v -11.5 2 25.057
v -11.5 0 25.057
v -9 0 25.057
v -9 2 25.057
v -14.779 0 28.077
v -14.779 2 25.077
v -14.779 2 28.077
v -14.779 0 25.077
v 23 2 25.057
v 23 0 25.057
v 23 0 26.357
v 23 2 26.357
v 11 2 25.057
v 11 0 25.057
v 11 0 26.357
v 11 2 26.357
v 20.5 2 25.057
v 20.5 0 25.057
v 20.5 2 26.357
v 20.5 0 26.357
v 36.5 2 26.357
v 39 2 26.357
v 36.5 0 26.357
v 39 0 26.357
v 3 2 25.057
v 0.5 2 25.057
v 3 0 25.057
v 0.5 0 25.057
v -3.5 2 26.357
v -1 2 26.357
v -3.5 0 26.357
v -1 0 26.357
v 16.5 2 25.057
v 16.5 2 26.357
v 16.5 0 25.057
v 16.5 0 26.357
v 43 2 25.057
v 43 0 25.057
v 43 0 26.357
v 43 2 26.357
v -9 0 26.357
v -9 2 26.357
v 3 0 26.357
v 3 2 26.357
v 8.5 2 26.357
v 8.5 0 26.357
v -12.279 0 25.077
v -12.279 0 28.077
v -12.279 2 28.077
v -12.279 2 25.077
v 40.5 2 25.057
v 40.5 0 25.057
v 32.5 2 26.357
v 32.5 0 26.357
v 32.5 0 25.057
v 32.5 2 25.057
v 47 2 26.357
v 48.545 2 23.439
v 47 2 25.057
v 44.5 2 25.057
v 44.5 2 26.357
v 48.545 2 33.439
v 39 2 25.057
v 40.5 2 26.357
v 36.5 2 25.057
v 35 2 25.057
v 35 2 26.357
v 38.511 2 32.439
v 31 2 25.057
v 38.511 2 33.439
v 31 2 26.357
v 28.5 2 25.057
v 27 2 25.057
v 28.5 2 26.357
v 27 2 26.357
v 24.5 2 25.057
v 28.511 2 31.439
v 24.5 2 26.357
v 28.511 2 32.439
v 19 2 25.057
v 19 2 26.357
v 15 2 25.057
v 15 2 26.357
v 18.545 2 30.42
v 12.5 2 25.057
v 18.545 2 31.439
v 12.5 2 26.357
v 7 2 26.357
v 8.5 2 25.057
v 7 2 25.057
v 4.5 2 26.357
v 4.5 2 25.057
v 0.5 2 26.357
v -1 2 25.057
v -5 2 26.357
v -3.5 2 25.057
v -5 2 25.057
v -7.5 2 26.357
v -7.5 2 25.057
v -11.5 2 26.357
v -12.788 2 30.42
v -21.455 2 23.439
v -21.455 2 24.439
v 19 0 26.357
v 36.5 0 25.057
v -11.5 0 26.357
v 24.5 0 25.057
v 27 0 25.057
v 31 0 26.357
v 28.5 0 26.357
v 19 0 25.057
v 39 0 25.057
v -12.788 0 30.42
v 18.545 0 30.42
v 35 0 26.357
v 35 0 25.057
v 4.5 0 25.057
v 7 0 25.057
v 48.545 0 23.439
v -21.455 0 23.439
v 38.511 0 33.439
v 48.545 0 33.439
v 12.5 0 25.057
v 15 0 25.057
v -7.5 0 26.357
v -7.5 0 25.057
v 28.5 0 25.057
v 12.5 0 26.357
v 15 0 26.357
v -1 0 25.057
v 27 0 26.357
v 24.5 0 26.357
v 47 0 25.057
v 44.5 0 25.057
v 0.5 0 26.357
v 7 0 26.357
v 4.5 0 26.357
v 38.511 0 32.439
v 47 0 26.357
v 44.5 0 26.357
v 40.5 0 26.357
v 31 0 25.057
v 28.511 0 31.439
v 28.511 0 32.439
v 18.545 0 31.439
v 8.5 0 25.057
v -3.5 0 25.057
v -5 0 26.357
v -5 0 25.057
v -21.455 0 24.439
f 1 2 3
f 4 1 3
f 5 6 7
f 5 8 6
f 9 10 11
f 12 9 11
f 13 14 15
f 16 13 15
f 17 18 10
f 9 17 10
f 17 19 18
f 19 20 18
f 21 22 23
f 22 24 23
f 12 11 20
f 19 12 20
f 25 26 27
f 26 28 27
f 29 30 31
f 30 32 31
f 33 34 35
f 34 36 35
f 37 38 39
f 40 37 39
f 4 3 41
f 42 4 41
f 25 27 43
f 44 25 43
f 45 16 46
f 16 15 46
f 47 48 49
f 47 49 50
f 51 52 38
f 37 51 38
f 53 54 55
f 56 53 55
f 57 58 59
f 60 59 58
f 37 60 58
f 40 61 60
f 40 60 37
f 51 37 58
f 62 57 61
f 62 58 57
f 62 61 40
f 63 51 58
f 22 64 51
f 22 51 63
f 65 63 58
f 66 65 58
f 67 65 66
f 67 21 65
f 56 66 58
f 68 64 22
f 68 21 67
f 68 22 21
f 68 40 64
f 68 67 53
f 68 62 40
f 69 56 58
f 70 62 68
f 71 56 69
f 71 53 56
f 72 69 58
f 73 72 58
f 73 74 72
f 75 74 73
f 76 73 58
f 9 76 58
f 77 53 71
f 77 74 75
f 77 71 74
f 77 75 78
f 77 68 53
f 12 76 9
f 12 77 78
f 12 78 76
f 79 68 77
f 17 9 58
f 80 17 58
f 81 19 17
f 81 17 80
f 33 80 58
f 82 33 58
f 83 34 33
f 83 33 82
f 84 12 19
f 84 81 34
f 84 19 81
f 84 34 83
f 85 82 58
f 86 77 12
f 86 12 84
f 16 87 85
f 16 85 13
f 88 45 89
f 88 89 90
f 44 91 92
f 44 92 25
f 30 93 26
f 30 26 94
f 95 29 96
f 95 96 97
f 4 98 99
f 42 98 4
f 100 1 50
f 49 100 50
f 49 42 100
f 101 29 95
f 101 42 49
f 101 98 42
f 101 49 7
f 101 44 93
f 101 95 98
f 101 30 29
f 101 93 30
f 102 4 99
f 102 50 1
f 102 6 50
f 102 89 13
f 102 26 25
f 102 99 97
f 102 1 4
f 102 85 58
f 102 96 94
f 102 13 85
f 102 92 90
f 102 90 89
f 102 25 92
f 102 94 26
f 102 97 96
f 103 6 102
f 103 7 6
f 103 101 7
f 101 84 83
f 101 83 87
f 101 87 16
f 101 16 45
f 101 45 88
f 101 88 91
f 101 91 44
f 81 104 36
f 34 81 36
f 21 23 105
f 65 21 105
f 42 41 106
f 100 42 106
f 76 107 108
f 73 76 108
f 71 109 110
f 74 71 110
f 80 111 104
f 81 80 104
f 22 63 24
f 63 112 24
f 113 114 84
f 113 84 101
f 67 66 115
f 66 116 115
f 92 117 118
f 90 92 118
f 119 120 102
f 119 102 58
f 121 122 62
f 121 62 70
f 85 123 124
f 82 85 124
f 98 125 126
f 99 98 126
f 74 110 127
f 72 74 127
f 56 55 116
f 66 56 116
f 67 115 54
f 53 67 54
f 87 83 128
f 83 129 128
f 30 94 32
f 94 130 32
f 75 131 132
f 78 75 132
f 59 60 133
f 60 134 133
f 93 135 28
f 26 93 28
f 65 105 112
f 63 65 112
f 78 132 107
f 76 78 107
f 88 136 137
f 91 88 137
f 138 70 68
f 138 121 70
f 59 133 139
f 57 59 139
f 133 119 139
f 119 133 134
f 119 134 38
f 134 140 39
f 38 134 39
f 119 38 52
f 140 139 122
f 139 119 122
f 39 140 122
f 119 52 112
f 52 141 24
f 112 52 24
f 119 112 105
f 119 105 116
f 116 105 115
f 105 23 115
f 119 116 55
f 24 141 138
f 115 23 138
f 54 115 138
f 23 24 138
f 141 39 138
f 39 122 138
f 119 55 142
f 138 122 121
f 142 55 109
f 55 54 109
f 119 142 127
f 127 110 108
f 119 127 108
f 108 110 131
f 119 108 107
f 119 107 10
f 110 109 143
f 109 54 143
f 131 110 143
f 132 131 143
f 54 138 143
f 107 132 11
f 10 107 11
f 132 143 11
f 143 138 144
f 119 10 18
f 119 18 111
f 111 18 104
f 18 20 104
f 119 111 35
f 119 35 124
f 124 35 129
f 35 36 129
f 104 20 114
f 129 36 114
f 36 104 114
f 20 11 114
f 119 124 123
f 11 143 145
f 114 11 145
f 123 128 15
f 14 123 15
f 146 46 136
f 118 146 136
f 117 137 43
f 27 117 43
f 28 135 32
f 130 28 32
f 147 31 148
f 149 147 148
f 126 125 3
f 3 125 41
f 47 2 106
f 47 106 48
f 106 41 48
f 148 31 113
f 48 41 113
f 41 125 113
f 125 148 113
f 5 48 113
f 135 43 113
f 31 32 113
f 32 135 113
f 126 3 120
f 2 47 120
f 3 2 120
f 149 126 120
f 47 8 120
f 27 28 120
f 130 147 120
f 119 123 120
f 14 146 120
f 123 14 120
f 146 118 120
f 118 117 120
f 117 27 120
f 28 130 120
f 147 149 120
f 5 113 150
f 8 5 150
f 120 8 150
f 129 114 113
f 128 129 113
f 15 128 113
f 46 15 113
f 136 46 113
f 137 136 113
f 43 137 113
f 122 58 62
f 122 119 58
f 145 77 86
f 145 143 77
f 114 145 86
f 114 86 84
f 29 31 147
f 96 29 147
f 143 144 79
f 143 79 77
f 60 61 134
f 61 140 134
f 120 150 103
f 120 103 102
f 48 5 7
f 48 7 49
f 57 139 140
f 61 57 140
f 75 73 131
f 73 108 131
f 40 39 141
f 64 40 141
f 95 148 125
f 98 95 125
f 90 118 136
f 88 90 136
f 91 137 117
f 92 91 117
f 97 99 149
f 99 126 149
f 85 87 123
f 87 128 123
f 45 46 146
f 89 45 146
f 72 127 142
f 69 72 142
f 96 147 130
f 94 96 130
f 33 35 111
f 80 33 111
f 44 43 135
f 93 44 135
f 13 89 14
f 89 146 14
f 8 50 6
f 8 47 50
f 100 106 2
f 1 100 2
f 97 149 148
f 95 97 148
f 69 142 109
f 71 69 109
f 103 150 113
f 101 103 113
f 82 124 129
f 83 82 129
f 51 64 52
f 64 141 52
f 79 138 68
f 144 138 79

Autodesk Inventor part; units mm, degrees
ref_plane "YZ Plane" through (0, 0, 0) normal (1, 0, 0) x (0, 1, 0)
ref_plane "XZ Plane" through (0, 0, 0) normal (0, 1, 0) x (-1, 0, 0)
ref_plane "XY Plane" through (0, 0, 0) normal (0, 0, 1) x (1, 0, 0)
sketch "草圖1" plane through (0, 0, 0) normal (0, 1, 0) x (-1, 0, 0)
  line L0 (21.4547, 24.4389) -> (-48.5453, 24.4389)
  line L1 (0.9998, 25.0567) -> (0.9998, 26.3567)
  line L2 (3.4998, 26.3567) -> (3.4998, 25.0567)
  line L3 (0.9998, 26.3567) -> (3.4998, 26.3567)
  line L4 (3.4998, 25.0567) -> (0.9998, 25.0567)
  line L5 (4.9998, 25.0567) -> (4.9998, 26.3567)
  line L6 (-18.5453, 30.4195) -> (12.788, 30.4195)
  line L7 (7.4998, 26.3567) -> (7.4998, 25.0567)
  line L8 (7.4998, 25.0567) -> (4.9998, 25.0567)
  line L9 (4.9998, 26.3567) -> (7.4998, 26.3567)
  line L10 (8.9998, 25.0567) -> (8.9998, 26.3567)
  line L11 (8.9998, 26.3567) -> (11.4998, 26.3567)
  line L12 (-48.5453, 23.4389) -> (-48.5453, 33.4389)
  line L13 (-38.5108, 33.4389) -> (-38.5108, 32.4389)
  line L14 (-38.5108, 32.4389) -> (-28.5108, 32.4389)
  line L15 (-28.5108, 32.4389) -> (-28.5108, 31.4389)
  line L16 (-18.5453, 31.4389) -> (-18.5453, 30.4195)
  line L17 (-28.5108, 31.4389) -> (-18.5453, 31.4389)
  line L18 (11.4998, 25.0567) -> (8.9998, 25.0567)
  line L19 (-44.5002, 26.3567) -> (-44.5002, 25.0567)
  line L20 (-44.5002, 25.0567) -> (-47.0002, 25.0567)
  line L21 (11.4998, 26.3567) -> (11.4998, 25.0567)
  line L22 (-40.5002, 26.3567) -> (-40.5002, 25.0567)
  line L23 (-40.5002, 25.0567) -> (-43.0002, 25.0567)
  line L24 (-47.0002, 25.0567) -> (-47.0002, 26.3567)
  line L25 (-47.0002, 26.3567) -> (-44.5002, 26.3567)
  line L26 (-43.0002, 26.3567) -> (-40.5002, 26.3567)
  line L27 (-36.5002, 26.3567) -> (-36.5002, 25.0567)
  line L28 (-39.0002, 26.3567) -> (-36.5002, 26.3567)
  line L29 (-39.0002, 25.0567) -> (-39.0002, 26.3567)
  line L30 (-36.5002, 25.0567) -> (-39.0002, 25.0567)
  line L31 (-43.0002, 25.0567) -> (-43.0002, 26.3567)
  line L32 (-32.5002, 26.3567) -> (-32.5002, 25.0567)
  line L33 (-32.5002, 25.0567) -> (-35.0002, 25.0567)
  line L34 (-35.0002, 26.3567) -> (-32.5002, 26.3567)
  line L35 (-35.0002, 25.0567) -> (-35.0002, 26.3567)
  line L36 (-28.5002, 26.3567) -> (-28.5002, 25.0567)
  line L37 (-28.5002, 25.0567) -> (-31.0002, 25.0567)
  line L38 (-31.0002, 26.3567) -> (-28.5002, 26.3567)
  line L39 (-31.0002, 25.0567) -> (-31.0002, 26.3567)
  line L40 (-24.5002, 26.3567) -> (-24.5002, 25.0567)
  line L41 (-24.5002, 25.0567) -> (-27.0002, 25.0567)
  line L42 (-27.0002, 25.0567) -> (-27.0002, 26.3567)
  line L43 (-27.0002, 26.3567) -> (-24.5002, 26.3567)
  line L44 (-20.5002, 26.3567) -> (-20.5002, 25.0567)
  line L45 (-20.5002, 25.0567) -> (-23.0002, 25.0567)
  line L46 (-23.0002, 26.3567) -> (-20.5002, 26.3567)
  line L47 (-23.0002, 25.0567) -> (-23.0002, 26.3567)
  line L48 (-16.5002, 26.3567) -> (-16.5002, 25.0567)
  line L49 (-19.0002, 26.3567) -> (-16.5002, 26.3567)
  line L50 (-19.0002, 25.0567) -> (-19.0002, 26.3567)
  line L51 (-16.5002, 25.0567) -> (-19.0002, 25.0567)
  line L52 (-12.5002, 26.3567) -> (-12.5002, 25.0567)
  line L53 (-15.0002, 26.3567) -> (-12.5002, 26.3567)
  line L54 (-15.0002, 25.0567) -> (-15.0002, 26.3567)
  line L55 (-12.5002, 25.0567) -> (-15.0002, 25.0567)
  line L56 (-8.5002, 26.3567) -> (-8.5002, 25.0567)
  line L57 (-8.5002, 25.0567) -> (-11.0002, 25.0567)
  line L58 (-11.0002, 25.0567) -> (-11.0002, 26.3567)
  line L59 (-11.0002, 26.3567) -> (-8.5002, 26.3567)
  line L60 (-4.5002, 25.0567) -> (-7.0002, 25.0567)
  line L61 (-7.0002, 26.3567) -> (-4.5002, 26.3567)
  line L62 (-7.0002, 25.0567) -> (-7.0002, 26.3567)
  line L63 (-4.5002, 26.3567) -> (-4.5002, 25.0567)
  line L64 (-3.0002, 25.0567) -> (-3.0002, 26.3567)
  line L65 (-0.5002, 25.0567) -> (-3.0002, 25.0567)
  line L66 (-3.0002, 26.3567) -> (-0.5002, 26.3567)
  line L67 (-0.5002, 26.3567) -> (-0.5002, 25.0567)
  line L68 (-48.5453, 33.4389) -> (-38.5108, 33.4389)
  line L69 (21.4547, 24.4389) -> (12.788, 30.4195)
  line L70 (12.2792, 28.0771) -> (12.2792, 25.0771)
  line L71 (14.7792, 28.0771) -> (12.2792, 28.0771)
  line L72 (12.2792, 25.0771) -> (14.7792, 25.0771)
  line L73 (14.7792, 25.0771) -> (14.7792, 28.0771)
  line L74 (-48.5453, 33.4389) -> (-48.5453, 23.4389)
  line L75 (-48.5453, 23.4389) -> (-48.5453, 24.4389)
  line L76 (-48.5453, 24.4389) -> (21.4547, 24.4389)
  line L77 (21.4547, 24.4389) -> (21.4547, 23.4389)
  line L78 (21.4547, 23.4389) -> (-48.5453, 23.4389)
  point P0 (34.4342, -20.4461)
  dimension "d19" = 2.5
  dimension "d20" = 3
  dimension "d26" = 70
  dimension "d27" = 10
extrude "擠出1" add sketch "草圖1" along normal blind 2
properties part number "援助旁邊4跟"
